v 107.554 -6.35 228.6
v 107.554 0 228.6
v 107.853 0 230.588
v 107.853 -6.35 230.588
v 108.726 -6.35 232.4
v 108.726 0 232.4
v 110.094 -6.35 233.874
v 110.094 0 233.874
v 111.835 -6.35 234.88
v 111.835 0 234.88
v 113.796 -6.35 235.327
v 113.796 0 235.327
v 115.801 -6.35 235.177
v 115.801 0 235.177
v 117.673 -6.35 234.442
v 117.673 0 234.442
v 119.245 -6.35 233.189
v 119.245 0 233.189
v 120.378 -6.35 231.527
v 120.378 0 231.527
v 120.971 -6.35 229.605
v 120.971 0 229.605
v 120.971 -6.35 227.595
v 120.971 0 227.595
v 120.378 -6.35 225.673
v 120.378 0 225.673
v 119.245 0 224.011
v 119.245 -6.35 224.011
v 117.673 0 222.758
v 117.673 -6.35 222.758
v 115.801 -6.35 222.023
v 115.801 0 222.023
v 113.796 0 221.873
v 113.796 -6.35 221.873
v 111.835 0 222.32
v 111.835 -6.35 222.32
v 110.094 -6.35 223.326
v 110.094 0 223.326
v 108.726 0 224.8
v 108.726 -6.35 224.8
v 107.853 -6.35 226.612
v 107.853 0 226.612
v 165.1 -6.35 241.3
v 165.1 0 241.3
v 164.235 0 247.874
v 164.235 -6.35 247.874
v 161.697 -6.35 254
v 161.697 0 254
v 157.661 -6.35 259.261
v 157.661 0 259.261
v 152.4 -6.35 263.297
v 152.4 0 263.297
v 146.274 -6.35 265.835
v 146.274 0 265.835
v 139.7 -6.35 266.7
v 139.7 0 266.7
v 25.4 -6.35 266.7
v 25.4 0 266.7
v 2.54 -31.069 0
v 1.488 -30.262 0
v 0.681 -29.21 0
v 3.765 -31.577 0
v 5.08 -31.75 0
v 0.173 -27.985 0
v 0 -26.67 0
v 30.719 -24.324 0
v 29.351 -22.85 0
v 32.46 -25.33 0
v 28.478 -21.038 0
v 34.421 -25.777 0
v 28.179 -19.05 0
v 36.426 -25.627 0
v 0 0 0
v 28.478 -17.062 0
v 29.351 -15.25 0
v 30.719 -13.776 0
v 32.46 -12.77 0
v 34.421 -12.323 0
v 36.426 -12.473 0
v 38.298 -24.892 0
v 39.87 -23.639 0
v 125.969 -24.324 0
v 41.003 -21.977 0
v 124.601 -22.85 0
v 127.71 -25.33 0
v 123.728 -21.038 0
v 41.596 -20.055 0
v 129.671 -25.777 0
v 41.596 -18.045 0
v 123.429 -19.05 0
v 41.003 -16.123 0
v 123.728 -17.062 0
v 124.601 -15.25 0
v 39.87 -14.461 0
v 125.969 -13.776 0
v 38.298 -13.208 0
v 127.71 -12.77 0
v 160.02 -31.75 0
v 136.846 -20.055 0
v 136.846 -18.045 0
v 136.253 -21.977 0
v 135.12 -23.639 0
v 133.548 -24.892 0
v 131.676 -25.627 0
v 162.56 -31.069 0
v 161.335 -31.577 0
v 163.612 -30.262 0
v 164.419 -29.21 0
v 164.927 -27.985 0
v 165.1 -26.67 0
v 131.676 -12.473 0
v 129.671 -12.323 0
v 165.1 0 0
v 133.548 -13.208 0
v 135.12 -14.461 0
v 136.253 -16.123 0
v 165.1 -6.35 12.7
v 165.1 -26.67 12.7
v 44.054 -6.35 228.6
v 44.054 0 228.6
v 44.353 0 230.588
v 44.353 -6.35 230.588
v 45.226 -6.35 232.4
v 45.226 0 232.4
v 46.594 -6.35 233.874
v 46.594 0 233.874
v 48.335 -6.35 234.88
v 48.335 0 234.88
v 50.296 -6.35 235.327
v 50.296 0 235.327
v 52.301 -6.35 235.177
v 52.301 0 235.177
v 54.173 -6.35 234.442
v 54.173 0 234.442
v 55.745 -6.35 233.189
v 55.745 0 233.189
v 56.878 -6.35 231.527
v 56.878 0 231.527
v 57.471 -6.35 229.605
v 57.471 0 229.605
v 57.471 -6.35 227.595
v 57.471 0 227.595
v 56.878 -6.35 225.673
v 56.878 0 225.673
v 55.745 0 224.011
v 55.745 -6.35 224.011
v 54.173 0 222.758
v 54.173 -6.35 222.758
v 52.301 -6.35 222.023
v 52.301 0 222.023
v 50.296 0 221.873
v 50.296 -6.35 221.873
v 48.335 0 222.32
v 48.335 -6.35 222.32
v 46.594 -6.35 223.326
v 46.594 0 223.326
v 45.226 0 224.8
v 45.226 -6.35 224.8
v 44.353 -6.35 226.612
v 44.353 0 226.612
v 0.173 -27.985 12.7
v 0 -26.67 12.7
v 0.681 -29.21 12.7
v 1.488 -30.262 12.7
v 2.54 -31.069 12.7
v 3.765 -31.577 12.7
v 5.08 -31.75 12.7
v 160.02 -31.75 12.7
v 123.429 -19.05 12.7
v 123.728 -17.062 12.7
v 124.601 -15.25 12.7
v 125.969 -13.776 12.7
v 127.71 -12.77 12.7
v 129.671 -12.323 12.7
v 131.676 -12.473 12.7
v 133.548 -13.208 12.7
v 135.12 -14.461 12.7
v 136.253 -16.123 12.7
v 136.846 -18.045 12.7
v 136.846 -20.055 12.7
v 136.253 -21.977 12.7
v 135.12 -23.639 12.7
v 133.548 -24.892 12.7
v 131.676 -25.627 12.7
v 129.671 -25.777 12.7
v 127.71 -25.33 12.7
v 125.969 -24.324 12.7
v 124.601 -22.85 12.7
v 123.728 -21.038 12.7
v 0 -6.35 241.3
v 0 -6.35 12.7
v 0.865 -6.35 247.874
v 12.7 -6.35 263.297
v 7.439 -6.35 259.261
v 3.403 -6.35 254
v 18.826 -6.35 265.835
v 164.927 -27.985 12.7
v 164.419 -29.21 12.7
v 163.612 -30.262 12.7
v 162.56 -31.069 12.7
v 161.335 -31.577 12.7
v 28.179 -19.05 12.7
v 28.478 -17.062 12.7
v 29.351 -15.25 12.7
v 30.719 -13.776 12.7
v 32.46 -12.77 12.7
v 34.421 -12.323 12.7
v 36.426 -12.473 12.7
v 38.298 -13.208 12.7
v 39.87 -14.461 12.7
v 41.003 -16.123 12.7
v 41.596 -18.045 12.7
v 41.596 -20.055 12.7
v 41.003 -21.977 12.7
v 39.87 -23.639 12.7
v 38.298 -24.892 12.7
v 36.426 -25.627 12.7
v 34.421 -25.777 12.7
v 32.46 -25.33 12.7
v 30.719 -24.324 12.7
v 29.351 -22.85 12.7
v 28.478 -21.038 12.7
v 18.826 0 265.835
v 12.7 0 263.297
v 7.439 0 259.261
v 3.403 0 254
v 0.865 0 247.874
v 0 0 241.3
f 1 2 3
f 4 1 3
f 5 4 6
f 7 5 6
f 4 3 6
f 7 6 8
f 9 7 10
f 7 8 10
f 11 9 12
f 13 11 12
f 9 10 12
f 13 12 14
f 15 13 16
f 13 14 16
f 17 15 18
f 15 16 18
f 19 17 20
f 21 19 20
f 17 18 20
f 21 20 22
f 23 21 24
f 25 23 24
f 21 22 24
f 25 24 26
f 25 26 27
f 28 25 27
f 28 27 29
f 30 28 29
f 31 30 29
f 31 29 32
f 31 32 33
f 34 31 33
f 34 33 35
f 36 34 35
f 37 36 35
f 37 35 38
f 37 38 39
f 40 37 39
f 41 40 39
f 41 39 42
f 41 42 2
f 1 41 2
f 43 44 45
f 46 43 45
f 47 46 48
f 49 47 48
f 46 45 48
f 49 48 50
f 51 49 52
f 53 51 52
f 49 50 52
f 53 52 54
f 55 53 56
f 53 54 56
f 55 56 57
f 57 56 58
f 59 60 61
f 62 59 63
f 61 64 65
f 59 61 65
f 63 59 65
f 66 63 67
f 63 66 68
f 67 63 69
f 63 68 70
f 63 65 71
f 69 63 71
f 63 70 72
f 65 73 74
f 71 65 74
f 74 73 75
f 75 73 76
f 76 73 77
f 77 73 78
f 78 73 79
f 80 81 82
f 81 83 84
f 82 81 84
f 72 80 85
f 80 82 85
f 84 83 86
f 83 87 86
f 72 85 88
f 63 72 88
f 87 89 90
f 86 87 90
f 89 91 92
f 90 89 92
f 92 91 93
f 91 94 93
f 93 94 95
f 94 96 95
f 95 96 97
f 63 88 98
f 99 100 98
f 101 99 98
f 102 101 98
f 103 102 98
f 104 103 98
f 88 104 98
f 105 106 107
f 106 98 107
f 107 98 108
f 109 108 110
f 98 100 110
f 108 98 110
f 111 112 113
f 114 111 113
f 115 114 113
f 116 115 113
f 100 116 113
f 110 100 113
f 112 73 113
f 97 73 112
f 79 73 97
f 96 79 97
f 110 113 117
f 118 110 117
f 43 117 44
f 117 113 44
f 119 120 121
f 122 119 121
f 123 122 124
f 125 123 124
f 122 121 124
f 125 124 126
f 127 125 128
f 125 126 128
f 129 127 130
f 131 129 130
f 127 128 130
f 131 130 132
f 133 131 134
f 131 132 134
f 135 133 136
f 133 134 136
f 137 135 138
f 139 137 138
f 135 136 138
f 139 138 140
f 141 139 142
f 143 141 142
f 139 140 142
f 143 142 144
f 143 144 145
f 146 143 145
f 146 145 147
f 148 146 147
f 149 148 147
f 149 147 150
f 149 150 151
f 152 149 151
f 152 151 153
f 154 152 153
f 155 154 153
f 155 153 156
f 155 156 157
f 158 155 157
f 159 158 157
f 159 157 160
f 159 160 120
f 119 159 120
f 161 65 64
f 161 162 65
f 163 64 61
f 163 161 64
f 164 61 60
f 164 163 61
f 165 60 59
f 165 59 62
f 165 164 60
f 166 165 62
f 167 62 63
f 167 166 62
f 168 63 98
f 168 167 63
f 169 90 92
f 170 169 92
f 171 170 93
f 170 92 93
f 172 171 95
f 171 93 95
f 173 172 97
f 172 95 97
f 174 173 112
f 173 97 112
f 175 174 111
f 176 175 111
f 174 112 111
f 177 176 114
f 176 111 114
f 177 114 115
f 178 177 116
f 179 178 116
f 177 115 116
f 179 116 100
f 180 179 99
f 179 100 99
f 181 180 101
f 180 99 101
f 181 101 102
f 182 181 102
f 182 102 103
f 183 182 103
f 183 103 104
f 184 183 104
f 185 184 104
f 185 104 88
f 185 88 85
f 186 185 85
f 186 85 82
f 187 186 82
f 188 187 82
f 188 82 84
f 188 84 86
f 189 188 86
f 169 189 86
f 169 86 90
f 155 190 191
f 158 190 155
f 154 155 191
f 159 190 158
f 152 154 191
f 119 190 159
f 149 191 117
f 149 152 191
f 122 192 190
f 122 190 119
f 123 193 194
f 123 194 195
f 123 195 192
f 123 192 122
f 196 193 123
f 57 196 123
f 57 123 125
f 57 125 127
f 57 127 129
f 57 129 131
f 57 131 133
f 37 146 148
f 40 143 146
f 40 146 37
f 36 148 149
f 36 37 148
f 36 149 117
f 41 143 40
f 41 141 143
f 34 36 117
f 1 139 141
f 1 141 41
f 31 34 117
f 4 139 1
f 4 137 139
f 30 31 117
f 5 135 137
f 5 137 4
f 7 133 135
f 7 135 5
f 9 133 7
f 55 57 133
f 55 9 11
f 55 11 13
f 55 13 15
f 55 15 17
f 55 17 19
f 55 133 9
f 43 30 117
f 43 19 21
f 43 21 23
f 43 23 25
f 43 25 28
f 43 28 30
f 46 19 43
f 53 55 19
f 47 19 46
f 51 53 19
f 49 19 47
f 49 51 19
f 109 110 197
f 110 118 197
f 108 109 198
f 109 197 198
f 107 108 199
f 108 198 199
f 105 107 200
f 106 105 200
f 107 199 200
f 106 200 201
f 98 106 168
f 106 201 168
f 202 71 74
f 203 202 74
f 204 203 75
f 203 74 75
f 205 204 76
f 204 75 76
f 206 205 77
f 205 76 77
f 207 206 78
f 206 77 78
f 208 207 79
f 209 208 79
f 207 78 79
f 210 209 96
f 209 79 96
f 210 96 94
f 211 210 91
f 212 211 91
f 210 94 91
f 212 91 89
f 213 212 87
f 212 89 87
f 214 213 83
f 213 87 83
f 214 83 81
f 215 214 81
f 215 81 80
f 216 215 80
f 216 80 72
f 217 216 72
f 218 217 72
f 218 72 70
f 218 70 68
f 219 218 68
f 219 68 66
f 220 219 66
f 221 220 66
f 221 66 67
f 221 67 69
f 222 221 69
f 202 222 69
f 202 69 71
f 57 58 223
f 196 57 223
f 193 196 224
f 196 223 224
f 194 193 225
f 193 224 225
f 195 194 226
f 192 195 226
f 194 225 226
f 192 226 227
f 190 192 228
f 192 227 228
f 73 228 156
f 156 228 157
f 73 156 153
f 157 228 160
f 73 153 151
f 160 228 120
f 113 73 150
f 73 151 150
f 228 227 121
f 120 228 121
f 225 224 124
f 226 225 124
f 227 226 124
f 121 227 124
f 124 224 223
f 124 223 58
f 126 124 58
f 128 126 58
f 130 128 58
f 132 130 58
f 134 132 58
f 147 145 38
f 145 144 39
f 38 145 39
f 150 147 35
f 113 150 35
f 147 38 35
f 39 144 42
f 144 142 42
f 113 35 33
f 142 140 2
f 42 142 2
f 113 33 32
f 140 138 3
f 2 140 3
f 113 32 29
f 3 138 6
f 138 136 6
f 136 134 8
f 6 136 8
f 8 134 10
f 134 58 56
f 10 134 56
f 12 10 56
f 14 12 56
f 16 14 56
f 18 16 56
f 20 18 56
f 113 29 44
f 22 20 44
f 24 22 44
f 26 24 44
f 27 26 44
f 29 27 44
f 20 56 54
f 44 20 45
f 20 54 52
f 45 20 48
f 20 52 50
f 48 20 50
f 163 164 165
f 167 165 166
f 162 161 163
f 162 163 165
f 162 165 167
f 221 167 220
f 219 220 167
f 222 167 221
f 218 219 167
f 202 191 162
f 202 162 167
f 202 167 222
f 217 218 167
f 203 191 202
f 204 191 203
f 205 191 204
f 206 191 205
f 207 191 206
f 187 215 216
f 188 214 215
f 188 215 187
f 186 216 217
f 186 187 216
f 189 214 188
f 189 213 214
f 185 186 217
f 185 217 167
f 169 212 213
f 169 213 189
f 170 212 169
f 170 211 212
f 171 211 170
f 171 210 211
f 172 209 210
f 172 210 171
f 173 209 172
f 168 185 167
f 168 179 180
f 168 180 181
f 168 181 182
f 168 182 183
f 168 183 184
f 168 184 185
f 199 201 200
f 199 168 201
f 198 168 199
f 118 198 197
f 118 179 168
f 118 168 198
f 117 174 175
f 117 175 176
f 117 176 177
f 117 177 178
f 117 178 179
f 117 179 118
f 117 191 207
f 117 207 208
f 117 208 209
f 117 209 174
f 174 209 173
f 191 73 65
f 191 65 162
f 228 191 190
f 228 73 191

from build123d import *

# Parameters (mm, degrees)
F1_DEPTH = 6.35
F3_D     = 13.49248
F4_W     = 165.1
F4_H     = 12.7
F5_DEPTH = 25.4
F6_R     = 5.08
F8_D     = 13.49248


with BuildPart() as f1:
    # F0 (on Front) → F1 (new body)
    with BuildSketch(Plane.XZ):
        with BuildLine():
            Line((0, 241.3), (0, 0))
            Line((0, 0), (165.1, 0))
            Line((165.1, 0), (165.1, 241.3))
            ThreePointArc((165.1, 241.3), (157.6605122421, 259.2605122421), (139.7, 266.7))
            Line((139.7, 266.7), (25.4, 266.7))
            ThreePointArc((25.4, 266.7), (7.4394877579, 259.2605122421), (0, 241.3))
        make_face()
    extrude(amount=F1_DEPTH)

    # F3 (through all)
    with Locations(Plane.XZ.offset(6.35)):
        with Locations((50.8, 228.6), (114.3, 228.6)):
            Hole(F3_D / 2)

    # F4 (on face) → F5 (join)
    with BuildSketch(Plane.XZ.offset(6.35)):
        with Locations((82.55, 6.35)):
            Rectangle(F4_W, F4_H)
    extrude(amount=F5_DEPTH)

    # F6
    f6_edges = [f1.edges().sort_by_distance(p)[0] for p in [
        (165.1, -31.75, 6.35),
        (0, -31.75, 6.35),
    ]]
    fillet(f6_edges, radius=F6_R)

    # F8 (through all)
    with Locations(Plane.XY.offset(12.7)):
        with Locations((34.925, -19.05), (130.175, -19.05)):
            Hole(F8_D / 2)


solid = f1.part
